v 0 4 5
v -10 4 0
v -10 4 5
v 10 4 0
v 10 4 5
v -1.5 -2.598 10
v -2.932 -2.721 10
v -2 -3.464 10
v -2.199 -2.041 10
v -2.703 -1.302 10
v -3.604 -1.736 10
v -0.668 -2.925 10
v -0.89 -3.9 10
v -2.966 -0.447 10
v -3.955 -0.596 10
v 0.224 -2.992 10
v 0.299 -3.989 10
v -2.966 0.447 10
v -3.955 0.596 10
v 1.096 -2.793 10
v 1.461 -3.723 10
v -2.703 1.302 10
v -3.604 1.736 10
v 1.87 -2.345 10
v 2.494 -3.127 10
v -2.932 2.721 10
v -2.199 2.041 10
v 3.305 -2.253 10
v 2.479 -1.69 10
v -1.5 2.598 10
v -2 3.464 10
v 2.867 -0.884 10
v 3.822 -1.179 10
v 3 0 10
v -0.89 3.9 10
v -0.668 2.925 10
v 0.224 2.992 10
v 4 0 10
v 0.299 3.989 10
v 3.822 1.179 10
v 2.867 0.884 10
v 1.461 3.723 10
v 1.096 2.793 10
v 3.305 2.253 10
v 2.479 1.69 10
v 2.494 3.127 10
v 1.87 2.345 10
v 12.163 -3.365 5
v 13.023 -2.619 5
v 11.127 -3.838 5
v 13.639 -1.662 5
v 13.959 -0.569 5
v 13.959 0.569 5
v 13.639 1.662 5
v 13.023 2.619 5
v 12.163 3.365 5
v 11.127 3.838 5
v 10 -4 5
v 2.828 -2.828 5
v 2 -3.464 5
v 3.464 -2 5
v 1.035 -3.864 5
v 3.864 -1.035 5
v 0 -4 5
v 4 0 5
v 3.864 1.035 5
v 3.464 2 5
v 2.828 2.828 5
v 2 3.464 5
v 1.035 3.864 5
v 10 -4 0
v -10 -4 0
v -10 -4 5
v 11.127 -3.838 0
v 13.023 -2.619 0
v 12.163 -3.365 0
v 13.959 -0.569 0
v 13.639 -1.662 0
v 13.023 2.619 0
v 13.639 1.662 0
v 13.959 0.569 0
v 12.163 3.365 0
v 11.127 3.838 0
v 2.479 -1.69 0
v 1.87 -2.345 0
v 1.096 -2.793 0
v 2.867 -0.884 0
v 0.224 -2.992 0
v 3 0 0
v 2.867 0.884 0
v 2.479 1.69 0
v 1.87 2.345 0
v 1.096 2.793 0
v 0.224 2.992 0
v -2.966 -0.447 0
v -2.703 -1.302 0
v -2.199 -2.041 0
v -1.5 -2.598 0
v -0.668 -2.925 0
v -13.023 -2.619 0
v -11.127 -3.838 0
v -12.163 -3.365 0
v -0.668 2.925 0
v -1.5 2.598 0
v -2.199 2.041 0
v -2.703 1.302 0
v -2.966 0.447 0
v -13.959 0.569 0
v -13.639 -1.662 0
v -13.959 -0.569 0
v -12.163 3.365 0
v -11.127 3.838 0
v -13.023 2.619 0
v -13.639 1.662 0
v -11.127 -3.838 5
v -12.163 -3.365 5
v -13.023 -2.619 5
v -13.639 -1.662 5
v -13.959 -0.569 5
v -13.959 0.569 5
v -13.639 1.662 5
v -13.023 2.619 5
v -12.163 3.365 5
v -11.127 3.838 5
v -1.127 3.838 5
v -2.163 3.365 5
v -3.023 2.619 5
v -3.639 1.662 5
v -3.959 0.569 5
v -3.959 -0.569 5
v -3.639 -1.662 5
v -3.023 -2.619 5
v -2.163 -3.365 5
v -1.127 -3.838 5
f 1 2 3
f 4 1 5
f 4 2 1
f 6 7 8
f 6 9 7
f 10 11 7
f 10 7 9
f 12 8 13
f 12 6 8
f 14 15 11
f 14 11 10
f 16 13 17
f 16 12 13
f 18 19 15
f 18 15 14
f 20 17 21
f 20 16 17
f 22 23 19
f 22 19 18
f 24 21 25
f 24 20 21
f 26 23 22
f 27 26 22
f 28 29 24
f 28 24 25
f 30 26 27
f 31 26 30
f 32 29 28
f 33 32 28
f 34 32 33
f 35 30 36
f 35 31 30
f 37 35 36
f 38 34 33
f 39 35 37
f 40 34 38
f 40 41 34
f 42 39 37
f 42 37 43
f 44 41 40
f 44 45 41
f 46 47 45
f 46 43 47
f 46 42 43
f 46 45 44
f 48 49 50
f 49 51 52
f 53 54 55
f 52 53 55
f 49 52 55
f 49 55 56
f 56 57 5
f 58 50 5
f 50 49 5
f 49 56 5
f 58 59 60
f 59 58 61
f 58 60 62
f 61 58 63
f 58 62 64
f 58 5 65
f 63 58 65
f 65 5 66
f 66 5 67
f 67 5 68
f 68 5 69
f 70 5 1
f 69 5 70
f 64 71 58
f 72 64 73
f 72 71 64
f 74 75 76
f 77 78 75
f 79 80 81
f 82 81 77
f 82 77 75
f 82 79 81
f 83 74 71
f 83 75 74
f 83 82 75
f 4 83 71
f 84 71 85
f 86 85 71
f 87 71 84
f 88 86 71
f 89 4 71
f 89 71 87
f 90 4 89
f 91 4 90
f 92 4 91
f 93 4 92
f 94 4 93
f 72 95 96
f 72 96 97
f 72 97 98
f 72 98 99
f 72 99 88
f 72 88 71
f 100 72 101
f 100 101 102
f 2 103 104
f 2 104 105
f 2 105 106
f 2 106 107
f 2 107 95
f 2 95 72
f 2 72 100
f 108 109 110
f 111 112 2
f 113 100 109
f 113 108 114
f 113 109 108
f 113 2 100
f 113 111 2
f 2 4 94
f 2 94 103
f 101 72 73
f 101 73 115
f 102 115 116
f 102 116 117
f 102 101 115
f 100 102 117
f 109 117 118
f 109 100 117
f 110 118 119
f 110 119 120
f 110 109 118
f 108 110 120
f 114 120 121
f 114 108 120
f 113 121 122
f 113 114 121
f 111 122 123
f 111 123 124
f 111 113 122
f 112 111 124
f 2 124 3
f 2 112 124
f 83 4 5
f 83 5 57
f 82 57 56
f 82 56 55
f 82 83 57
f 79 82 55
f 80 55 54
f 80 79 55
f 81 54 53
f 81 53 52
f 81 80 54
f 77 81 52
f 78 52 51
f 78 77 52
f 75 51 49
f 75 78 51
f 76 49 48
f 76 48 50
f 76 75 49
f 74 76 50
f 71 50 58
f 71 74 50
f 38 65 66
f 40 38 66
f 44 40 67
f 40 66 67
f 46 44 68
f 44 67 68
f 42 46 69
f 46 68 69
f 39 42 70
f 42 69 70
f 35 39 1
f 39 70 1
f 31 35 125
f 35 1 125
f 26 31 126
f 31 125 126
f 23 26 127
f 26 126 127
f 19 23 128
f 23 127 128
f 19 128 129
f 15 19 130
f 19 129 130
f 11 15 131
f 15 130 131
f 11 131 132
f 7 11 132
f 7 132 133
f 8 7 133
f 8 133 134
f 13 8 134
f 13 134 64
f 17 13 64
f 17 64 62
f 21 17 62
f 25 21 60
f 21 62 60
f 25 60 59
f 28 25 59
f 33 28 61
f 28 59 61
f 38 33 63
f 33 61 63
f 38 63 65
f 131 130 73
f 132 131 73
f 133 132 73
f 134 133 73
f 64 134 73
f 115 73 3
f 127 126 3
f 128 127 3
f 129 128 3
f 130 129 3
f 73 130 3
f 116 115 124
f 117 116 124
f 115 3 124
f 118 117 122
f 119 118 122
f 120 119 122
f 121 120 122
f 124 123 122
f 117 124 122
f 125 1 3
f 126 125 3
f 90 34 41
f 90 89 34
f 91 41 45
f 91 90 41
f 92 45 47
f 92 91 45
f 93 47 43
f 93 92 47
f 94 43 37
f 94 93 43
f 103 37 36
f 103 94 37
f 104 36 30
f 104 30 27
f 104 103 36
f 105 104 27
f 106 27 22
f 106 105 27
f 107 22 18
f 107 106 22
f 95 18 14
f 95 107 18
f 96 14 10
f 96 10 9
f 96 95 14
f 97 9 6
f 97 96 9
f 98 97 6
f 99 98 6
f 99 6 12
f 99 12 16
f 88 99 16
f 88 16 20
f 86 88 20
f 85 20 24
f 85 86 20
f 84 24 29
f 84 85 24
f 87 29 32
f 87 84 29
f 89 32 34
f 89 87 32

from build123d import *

# Parameters (mm, degrees)
SKETCH1_R           = 3
BOSS_EXTRUDE1_DEPTH = 5
SKETCH2_R           = 4
SKETCH2_R_2         = 3
BOSS_EXTRUDE2_DEPTH = 5


with BuildPart() as part:
    # Sketch1 → Boss-Extrude1 (new body)
    with BuildSketch(Plane.XY):
        with BuildLine():
            Line((-10, 4), (10, 4))
            ThreePointArc((10, 4), (14, 0), (10, -4))
            Line((10, -4), (-10, -4))
            ThreePointArc((-10, -4), (-14, 0), (-10, 4))
        make_face()
        Circle(SKETCH1_R, mode=Mode.SUBTRACT)
    extrude(amount=BOSS_EXTRUDE1_DEPTH)

    # Sketch2 → Boss-Extrude2 (add)
    with BuildSketch(Plane.XY.offset(5)):
        Circle(SKETCH2_R)
        Circle(SKETCH2_R_2, mode=Mode.SUBTRACT)
    extrude(amount=BOSS_EXTRUDE2_DEPTH)


solid = part.part
